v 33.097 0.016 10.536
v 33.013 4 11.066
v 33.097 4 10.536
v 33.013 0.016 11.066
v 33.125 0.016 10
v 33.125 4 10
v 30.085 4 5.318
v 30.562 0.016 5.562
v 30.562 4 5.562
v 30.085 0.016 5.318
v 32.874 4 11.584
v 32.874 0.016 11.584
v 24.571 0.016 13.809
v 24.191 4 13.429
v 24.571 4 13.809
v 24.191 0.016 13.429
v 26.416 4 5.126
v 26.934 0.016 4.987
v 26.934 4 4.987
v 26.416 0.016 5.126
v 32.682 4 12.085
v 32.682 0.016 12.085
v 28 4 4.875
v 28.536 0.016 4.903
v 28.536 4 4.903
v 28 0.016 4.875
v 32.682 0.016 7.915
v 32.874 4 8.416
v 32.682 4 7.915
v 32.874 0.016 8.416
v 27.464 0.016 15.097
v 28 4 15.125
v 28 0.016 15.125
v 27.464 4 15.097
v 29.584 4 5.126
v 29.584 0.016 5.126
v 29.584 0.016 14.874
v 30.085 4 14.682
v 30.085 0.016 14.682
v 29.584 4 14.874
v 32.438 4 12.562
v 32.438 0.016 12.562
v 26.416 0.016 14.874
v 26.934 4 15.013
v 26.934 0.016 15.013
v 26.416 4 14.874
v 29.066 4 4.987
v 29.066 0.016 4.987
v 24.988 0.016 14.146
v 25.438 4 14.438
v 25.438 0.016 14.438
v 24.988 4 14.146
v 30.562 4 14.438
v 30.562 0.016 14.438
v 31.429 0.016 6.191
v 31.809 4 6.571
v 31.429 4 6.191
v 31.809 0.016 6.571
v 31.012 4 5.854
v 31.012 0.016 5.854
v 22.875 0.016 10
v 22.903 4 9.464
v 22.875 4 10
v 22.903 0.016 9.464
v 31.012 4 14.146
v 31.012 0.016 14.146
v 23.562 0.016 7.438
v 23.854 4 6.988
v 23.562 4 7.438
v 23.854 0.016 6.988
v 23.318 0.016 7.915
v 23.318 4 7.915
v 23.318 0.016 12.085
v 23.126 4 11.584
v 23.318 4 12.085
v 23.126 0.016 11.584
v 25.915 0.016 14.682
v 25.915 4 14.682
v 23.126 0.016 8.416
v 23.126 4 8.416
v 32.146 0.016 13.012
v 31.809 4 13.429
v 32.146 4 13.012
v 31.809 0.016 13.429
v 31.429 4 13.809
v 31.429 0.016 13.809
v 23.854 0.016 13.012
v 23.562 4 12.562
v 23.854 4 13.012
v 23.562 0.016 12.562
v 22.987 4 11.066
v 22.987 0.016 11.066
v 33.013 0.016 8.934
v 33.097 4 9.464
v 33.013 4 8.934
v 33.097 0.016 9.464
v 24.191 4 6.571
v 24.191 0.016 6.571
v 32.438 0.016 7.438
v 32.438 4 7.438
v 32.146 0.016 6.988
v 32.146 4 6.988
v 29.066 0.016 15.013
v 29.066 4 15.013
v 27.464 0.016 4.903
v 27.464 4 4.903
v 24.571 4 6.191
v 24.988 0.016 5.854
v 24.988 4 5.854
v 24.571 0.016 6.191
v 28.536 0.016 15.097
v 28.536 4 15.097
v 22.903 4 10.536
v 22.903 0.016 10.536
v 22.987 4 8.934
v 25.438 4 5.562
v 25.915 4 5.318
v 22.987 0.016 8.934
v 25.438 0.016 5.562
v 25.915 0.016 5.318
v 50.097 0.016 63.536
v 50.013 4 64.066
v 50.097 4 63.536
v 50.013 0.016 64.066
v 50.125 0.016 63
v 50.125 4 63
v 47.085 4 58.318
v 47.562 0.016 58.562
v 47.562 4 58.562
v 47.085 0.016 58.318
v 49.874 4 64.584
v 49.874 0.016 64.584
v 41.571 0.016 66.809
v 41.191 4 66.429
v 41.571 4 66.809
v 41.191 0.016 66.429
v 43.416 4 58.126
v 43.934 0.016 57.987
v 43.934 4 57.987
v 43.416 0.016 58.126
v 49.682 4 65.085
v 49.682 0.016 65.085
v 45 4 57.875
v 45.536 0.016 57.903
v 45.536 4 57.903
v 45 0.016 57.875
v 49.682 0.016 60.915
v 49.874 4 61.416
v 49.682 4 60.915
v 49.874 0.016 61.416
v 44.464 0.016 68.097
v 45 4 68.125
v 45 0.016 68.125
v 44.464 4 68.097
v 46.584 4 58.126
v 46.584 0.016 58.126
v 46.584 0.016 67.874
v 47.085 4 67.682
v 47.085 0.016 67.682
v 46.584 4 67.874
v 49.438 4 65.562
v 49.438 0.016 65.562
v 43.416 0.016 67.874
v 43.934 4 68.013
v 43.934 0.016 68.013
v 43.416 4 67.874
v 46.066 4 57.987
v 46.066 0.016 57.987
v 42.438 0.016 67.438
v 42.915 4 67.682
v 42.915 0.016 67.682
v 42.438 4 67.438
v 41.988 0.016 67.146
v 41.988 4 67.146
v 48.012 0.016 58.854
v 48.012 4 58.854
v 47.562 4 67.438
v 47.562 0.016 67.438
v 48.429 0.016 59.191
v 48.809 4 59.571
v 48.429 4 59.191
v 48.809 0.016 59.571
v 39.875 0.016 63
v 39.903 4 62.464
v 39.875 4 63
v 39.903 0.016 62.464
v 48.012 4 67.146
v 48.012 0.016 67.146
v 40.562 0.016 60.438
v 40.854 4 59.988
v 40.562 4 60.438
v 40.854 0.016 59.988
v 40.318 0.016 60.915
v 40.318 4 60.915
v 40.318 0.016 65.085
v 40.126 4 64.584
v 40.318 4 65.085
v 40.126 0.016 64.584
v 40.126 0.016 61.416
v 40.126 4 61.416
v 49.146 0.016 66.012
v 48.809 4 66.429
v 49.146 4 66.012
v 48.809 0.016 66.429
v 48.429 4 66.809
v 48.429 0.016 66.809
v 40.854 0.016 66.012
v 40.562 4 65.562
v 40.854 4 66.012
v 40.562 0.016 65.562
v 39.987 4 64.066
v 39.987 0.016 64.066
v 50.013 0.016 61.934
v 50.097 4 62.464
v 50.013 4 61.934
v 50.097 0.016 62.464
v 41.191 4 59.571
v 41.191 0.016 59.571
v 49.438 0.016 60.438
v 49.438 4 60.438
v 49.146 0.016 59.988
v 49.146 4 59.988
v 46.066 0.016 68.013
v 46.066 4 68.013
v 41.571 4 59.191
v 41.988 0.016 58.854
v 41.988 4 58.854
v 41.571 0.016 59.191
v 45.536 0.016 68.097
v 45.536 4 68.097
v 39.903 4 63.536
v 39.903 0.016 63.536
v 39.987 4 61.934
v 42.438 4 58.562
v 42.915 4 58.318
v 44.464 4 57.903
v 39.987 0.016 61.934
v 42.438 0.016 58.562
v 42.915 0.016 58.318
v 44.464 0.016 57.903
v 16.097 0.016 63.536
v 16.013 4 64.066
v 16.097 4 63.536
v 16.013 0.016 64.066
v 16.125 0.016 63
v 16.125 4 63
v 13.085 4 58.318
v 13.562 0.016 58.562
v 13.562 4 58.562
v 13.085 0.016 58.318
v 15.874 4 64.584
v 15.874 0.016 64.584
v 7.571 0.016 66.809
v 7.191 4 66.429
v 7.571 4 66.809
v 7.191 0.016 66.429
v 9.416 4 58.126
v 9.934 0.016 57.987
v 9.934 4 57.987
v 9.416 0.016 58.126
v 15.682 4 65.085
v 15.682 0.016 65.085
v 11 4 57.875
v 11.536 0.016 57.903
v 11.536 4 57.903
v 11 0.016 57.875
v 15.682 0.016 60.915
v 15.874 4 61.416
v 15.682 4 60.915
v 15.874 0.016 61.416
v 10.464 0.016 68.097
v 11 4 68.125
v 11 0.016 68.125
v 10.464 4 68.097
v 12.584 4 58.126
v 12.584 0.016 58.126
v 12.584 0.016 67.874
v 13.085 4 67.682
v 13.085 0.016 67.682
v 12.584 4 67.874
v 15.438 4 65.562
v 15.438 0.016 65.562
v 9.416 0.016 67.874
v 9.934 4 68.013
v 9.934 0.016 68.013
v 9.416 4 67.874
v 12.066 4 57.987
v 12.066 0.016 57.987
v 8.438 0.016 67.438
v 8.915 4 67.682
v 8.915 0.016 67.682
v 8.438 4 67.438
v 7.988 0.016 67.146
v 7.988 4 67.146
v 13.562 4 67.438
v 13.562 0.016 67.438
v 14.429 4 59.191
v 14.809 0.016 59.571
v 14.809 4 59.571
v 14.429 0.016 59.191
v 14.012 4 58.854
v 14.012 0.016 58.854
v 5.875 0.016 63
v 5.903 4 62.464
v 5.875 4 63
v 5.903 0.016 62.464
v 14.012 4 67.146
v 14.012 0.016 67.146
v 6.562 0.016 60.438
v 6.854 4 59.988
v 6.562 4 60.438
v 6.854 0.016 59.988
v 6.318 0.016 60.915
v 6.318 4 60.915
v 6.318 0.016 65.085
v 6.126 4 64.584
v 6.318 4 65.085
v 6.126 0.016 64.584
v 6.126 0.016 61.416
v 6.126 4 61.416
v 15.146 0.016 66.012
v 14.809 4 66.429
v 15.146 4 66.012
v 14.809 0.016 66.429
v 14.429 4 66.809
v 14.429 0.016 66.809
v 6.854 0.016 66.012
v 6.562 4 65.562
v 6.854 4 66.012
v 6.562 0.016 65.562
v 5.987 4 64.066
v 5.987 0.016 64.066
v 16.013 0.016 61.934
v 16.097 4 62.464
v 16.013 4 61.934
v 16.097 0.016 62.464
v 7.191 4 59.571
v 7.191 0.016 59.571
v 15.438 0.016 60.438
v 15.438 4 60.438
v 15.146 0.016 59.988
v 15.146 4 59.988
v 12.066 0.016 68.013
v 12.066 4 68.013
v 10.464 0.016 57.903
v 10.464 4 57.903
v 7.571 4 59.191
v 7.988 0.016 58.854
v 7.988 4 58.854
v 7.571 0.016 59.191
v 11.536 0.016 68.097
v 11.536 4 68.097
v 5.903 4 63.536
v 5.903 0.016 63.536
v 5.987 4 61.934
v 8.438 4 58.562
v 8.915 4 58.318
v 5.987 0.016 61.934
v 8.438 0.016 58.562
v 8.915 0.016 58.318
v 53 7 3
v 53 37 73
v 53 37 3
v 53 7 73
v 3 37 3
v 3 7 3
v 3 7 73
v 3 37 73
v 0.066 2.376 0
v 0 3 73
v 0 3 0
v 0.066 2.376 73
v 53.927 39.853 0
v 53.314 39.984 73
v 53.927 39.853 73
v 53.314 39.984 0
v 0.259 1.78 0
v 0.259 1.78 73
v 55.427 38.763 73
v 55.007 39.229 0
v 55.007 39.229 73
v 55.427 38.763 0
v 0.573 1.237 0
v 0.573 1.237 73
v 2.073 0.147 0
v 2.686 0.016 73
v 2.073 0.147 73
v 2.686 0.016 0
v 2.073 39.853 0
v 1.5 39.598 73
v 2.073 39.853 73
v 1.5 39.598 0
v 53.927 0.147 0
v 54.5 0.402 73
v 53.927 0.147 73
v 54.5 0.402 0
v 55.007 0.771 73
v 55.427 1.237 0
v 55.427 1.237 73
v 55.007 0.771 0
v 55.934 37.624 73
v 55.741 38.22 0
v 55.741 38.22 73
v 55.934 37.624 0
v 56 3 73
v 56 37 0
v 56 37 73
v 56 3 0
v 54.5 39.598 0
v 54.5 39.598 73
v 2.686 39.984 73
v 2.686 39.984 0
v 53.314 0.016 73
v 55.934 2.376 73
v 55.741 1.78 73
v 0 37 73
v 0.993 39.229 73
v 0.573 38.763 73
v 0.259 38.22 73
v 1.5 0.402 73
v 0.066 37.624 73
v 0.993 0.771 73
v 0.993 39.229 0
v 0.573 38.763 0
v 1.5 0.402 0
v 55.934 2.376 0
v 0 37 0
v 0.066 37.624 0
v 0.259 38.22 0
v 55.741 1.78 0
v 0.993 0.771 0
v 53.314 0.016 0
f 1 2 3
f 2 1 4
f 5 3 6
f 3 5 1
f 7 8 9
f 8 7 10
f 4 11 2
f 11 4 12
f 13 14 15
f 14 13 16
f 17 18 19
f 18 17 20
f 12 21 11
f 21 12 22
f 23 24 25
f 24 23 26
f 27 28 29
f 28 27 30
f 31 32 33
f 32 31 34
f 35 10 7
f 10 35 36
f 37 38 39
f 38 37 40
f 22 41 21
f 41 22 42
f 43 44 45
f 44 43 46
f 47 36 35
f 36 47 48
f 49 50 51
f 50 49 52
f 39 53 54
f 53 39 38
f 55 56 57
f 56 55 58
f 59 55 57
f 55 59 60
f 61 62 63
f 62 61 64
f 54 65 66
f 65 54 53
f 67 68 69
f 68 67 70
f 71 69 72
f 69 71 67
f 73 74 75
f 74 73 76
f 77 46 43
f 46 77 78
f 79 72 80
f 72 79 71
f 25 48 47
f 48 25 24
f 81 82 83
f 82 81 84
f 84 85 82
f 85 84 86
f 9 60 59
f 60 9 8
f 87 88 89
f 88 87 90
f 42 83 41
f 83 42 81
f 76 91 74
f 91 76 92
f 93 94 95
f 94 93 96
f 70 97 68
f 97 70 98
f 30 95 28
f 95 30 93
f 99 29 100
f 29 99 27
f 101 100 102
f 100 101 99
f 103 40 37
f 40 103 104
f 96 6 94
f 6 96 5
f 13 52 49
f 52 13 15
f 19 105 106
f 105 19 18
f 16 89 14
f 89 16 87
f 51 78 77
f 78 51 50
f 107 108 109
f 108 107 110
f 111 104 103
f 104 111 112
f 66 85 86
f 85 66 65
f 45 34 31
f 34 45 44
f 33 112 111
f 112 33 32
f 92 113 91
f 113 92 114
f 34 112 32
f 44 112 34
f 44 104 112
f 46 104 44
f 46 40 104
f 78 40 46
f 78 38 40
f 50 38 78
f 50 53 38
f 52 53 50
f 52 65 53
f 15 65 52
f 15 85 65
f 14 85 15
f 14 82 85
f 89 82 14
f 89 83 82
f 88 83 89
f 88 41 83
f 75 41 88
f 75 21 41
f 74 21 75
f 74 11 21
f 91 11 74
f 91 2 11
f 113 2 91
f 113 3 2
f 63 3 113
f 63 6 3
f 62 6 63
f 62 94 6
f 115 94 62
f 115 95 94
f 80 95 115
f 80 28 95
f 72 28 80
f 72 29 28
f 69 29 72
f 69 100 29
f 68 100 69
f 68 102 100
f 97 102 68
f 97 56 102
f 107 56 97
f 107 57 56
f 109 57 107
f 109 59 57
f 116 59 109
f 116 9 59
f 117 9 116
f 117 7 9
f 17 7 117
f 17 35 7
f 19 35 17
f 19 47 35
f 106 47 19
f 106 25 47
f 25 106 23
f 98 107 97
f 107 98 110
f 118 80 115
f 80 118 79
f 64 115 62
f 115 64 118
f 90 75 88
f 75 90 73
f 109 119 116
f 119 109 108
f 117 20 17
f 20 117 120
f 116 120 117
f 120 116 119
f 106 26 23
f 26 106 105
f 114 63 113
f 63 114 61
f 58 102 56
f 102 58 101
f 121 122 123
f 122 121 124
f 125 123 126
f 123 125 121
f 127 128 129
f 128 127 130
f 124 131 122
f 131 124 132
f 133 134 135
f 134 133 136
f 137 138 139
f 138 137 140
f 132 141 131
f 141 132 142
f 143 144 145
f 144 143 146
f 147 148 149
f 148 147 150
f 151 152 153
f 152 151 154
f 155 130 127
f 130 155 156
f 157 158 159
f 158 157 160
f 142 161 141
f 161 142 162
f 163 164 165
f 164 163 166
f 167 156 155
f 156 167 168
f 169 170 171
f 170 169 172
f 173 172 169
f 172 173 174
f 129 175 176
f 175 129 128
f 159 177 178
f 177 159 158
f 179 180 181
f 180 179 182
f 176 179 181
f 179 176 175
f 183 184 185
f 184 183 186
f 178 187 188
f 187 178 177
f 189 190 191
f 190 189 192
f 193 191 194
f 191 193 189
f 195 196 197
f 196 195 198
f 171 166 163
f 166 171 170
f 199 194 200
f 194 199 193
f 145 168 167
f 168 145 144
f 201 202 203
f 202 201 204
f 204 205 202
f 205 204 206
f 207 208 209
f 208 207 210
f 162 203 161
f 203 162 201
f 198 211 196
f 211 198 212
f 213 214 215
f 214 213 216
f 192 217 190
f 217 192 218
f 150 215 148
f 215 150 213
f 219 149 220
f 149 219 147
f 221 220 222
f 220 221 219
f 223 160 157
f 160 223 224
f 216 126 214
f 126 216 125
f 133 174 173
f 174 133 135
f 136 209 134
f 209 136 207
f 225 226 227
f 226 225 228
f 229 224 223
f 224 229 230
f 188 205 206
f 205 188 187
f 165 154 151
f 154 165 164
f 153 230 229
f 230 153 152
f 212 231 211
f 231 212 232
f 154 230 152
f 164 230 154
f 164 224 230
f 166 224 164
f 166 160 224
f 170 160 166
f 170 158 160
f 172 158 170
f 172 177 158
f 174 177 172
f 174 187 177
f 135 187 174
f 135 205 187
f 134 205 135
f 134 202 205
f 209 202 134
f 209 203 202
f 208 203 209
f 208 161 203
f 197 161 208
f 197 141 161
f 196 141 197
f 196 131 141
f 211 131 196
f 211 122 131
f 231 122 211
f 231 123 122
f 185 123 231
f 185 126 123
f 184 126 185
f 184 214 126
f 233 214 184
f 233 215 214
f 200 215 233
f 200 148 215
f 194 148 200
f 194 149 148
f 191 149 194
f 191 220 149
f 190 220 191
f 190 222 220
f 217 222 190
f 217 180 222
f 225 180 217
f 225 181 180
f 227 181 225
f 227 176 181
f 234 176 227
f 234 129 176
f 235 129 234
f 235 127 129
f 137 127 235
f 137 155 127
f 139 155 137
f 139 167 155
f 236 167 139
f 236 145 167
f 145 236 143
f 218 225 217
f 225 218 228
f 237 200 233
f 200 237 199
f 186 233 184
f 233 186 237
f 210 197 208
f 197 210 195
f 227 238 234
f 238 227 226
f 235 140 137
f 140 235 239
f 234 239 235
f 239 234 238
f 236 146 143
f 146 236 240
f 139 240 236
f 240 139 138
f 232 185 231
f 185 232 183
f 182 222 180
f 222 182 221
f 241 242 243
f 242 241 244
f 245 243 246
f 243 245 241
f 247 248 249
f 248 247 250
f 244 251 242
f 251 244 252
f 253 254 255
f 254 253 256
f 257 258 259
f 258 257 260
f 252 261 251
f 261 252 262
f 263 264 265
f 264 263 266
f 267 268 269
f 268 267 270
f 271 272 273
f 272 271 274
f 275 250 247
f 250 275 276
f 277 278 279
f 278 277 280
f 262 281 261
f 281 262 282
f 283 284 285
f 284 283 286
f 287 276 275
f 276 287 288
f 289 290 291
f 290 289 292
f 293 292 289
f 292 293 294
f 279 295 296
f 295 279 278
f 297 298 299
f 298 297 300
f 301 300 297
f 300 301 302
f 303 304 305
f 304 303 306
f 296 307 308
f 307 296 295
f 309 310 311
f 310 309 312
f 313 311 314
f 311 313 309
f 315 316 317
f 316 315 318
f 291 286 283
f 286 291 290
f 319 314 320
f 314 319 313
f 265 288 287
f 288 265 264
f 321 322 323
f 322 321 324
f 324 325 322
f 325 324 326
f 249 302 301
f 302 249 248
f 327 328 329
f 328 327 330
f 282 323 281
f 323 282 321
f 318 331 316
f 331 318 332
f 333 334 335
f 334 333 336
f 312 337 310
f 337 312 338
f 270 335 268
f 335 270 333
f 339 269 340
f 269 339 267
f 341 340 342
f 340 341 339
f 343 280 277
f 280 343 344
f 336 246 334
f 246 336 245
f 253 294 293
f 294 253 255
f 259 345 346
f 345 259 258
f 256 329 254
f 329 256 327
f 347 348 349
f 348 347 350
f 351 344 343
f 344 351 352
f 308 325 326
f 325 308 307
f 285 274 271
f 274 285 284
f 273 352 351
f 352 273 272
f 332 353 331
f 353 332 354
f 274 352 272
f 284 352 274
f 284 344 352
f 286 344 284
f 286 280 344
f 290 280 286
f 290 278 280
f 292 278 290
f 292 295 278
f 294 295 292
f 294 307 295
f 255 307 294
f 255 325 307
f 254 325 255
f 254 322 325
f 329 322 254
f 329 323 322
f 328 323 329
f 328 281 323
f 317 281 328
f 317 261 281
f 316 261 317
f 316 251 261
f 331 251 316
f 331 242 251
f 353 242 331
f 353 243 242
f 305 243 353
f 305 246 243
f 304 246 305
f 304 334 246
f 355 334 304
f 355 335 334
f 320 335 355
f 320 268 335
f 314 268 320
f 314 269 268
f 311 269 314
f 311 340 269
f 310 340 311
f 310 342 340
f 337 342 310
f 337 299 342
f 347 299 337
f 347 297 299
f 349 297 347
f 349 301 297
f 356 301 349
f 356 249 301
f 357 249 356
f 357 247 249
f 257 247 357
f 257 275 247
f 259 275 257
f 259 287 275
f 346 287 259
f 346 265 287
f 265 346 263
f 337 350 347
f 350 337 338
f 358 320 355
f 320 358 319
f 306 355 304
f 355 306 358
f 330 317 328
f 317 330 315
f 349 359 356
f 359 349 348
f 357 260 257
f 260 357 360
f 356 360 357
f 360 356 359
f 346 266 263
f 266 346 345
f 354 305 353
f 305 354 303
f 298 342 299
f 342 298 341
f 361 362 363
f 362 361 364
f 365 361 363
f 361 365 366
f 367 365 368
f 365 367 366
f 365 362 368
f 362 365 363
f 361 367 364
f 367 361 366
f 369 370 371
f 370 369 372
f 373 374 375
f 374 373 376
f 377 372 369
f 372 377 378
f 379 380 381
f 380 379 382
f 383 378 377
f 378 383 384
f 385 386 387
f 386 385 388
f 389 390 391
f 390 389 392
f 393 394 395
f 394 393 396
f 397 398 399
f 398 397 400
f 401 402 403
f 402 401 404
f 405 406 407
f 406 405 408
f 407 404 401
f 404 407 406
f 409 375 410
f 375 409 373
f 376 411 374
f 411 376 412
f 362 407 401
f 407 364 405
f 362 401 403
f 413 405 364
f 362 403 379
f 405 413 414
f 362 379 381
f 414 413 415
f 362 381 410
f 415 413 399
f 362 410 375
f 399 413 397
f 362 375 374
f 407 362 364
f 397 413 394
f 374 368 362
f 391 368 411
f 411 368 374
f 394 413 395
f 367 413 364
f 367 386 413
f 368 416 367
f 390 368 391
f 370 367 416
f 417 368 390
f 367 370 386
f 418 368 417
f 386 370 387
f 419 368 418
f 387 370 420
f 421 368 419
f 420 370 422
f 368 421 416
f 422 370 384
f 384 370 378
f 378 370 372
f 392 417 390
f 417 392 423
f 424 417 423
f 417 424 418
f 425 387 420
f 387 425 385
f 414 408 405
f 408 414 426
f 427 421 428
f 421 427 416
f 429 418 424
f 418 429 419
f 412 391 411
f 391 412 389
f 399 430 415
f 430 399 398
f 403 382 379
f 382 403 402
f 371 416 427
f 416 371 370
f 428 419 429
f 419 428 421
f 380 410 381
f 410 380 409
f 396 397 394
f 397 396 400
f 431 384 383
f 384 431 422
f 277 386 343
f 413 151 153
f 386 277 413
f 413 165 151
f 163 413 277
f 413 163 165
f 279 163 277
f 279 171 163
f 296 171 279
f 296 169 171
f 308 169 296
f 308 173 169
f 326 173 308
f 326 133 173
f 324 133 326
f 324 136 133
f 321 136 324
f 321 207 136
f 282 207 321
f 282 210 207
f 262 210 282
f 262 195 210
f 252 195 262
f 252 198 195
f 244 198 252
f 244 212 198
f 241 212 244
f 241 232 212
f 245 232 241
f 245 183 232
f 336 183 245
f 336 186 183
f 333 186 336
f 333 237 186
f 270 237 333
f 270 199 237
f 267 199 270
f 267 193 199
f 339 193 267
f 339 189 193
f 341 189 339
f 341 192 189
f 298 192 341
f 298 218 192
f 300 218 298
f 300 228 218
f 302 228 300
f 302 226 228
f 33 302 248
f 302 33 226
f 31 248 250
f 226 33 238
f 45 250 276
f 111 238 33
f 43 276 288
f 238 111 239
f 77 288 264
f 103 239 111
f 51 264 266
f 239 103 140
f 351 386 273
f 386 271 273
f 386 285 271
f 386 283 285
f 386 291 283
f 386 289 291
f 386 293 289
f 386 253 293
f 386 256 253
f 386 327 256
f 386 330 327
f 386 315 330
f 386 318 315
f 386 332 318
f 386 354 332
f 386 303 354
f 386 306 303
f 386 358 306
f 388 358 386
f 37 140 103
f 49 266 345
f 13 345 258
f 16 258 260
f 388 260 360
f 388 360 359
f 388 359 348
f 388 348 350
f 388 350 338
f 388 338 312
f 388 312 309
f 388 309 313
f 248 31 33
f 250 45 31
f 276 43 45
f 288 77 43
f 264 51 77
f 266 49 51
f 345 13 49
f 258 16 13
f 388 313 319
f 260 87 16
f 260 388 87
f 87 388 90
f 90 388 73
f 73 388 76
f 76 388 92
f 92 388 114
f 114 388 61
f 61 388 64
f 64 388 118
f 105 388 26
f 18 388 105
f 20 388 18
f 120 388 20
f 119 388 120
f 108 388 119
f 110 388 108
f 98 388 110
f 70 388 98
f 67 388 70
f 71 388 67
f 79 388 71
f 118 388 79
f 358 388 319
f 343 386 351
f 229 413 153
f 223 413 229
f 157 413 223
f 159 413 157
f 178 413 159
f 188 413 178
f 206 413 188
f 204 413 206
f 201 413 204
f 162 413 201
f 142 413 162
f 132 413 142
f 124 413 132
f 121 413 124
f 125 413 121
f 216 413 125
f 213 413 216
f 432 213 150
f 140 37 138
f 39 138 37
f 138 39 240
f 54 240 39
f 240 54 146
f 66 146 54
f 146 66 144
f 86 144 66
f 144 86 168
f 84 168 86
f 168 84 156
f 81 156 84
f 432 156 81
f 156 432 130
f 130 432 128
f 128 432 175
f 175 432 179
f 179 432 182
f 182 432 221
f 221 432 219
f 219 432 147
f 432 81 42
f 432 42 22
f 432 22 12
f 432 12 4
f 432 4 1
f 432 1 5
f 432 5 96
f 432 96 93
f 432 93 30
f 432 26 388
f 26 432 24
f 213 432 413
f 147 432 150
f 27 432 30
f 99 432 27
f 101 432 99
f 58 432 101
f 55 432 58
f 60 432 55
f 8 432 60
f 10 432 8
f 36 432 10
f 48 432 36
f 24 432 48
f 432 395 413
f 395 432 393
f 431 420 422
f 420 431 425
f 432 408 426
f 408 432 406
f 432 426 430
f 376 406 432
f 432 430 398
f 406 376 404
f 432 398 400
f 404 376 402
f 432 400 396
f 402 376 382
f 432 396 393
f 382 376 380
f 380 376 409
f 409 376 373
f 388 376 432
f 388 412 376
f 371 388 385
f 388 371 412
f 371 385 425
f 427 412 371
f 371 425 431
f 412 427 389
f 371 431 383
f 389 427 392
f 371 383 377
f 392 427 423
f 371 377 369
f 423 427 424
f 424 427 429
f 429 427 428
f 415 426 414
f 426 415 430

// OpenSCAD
// Inner width
cube_w = 50; // [10:1:200]

// Inner height
cube_h = 70; // [10:1:200]

// Inner depth
cube_d = 30; // [10:1:200]

// Wall thickness
cube_t = 3; // [1:0.1:10]

// Magnet diameter
magnet_d = 10; // [1:0.1:40]

// Magnet depth
magnet_t = 4; // [1:0.1:20]

// How many magnets?
magnets = 3; // [1:1:5]

// Do you want rounded edges?
rounded = 1; // [1:Yes,0:No]

// Do you want a text label?
label = 0; // [1:Yes,0:No]

// The text you want on the front
TextLabel = "keys";

// Font size
font_size = 10; // [4:1:30]
font = "REGISTRATION PLATE UK:style=Bold";

/* [Hidden] */
slack = 0.25; // Slack
detail = 60;  // Variable for detail of cylinder and square. High number = high detail

difference() {
    
  // ******
  // Solids
  // ******  
  union(){
   
  if (rounded == 0) {
      cube([cube_w+cube_t*2,cube_d+cube_t*2+magnet_t,cube_h+cube_t],false);
  } // End if rounded
          
  if (rounded == 1) {   
     roundedcube([cube_w+cube_t*2,cube_d+cube_t*2+magnet_t,cube_h+cube_t], false, cube_t, "z");
  } // End if rounded
  
  } // End union Solids

 
  // *********
  // Subtracts
  // *********  
  union(){
  
  if (label == 1) {
      
    if (cube_t >= 2) {
   // Cut out text
   translate([cube_w/2+cube_t,cube_d+cube_t*2+magnet_t-1,cube_h/2+cube_t/2]) {
    rotate([90,0,180]) {
      linear_extrude(height = 1.6) {
        text(text = str(TextLabel), font = font, size = font_size, valign = "center", halign = "center");
      }
    }
    }
   } 
   
      if (cube_t < 2) {
   // Cut out text
   translate([cube_w/2+cube_t,cube_d+cube_t*2+magnet_t-0.6,cube_h/2+cube_t/2]) {
    rotate([90,0,180]) {
      linear_extrude(height = 1.6) {
        text(text = str(TextLabel), font = font, size = font_size, valign = "center", halign = "center");
      }
    }
    }
   } 
   
    }
      
  if (magnets == 1) {
          translate([cube_w/2+cube_t,magnet_t,cube_h/2+cube_t]) {
        rotate([90,0,0]) { 
          cylinder(d1=magnet_d+slack,d2=magnet_d+slack,h=magnet_t+slack,$fn=detail);
        } // End rotate
      } // End translate
   } // End if magnets 
 
   if (magnets == 2) {
  translate([cube_w+cube_t*2-(magnet_d/2+cube_t*2),magnet_t,cube_h+cube_t-magnet_d]) {
    rotate([90,0,0]) { 
      cylinder(d1=magnet_d+slack,d2=magnet_d+slack,h=magnet_t+slack,$fn=detail);
    } // End rotate
  } // End translate
 
  translate([magnet_d/2+cube_t*2,magnet_t,cube_h+cube_t-magnet_d]) {
    rotate([90,0,0]) { 
      cylinder(d1=magnet_d+slack,d2=magnet_d+slack,h=magnet_t+slack,$fn=detail);
    } // End rotate
  } // End translate
  
  } // End if magnets
  
  if (magnets == 3) {
      translate([cube_w/2+cube_t,magnet_t,magnet_d]) {
        rotate([90,0,0]) { 
          cylinder(d1=magnet_d+slack,d2=magnet_d+slack,h=magnet_t+slack,$fn=detail);
        } // End rotate
      } // End translate
      
       translate([cube_w+cube_t*2-(magnet_d/2+cube_t*2),magnet_t,cube_h+cube_t-magnet_d]) {
    rotate([90,0,0]) { 
      cylinder(d1=magnet_d+slack,d2=magnet_d+slack,h=magnet_t+slack,$fn=detail);
    } // End rotate
  } // End translate
 
  translate([magnet_d/2+cube_t*2,magnet_t,cube_h+cube_t-magnet_d]) {
    rotate([90,0,0]) { 
      cylinder(d1=magnet_d+slack,d2=magnet_d+slack,h=magnet_t+slack,$fn=detail);
    } // End rotate
  } // End translate
  
  } // End if magnets
  
  if (magnets == 4) {
      
      translate([cube_w+cube_t*2-(magnet_d/2+cube_t*2),magnet_t,cube_h+cube_t-magnet_d]) {
    rotate([90,0,0]) { 
      cylinder(d1=magnet_d+slack,d2=magnet_d+slack,h=magnet_t+slack,$fn=detail);
    } // End rotate
  } // End translate
 
  translate([magnet_d/2+cube_t*2,magnet_t,cube_h+cube_t-magnet_d]) {
    rotate([90,0,0]) { 
      cylinder(d1=magnet_d+slack,d2=magnet_d+slack,h=magnet_t+slack,$fn=detail);
    } // End rotate
  } // End translate
      
       translate([cube_w+cube_t*2-(magnet_d/2+cube_t*2),magnet_t,magnet_d]) {
         rotate([90,0,0]) { 
         cylinder(d1=magnet_d+slack,d2=magnet_d+slack,h=magnet_t+slack,$fn=detail);
    } // End rotate
  } // End translate
 
  translate([magnet_d/2+cube_t*2,magnet_t,magnet_d]) {
    rotate([90,0,0]) { 
      cylinder(d1=magnet_d+slack,d2=magnet_d+slack,h=magnet_t+slack,$fn=detail);
    } // End rotate
  } // End translate
 } // End if magnets
  
 
  if (magnets == 5) {
      
       translate([cube_w+cube_t*2-(magnet_d/2+cube_t*2),magnet_t,cube_h+cube_t-magnet_d]) {
    rotate([90,0,0]) { 
      cylinder(d1=magnet_d+slack,d2=magnet_d+slack,h=magnet_t+slack,$fn=detail);
    } // End rotate
  } // End translate
 
  translate([magnet_d/2+cube_t*2,magnet_t,cube_h+cube_t-magnet_d]) {
    rotate([90,0,0]) { 
      cylinder(d1=magnet_d+slack,d2=magnet_d+slack,h=magnet_t+slack,$fn=detail);
    } // End rotate
  } // End translate
      
       translate([cube_w+cube_t*2-(magnet_d/2+cube_t*2),magnet_t,magnet_d]) {
         rotate([90,0,0]) { 
         cylinder(d1=magnet_d+slack,d2=magnet_d+slack,h=magnet_t+slack,$fn=detail);
    } // End rotate
  } // End translate
 
  translate([magnet_d/2+cube_t*2,magnet_t,magnet_d]) {
    rotate([90,0,0]) { 
      cylinder(d1=magnet_d+slack,d2=magnet_d+slack,h=magnet_t+slack,$fn=detail);
    } // End rotate
  } // End translate

    translate([cube_w/2+cube_t,magnet_t,cube_h/2+cube_t]) {
        rotate([90,0,0]) { 
          cylinder(d1=magnet_d+slack,d2=magnet_d+slack,h=magnet_t+slack,$fn=detail);
        } // End rotate
      } // End translate
  
 } // End if magnets
  
 
     translate([cube_t,cube_t+magnet_t,cube_t]) {
      cube([cube_w,cube_d,cube_h+1],false);
    } // End translate
 
 
  
  } // End union subtracts

} // End difference


// Rounded corners from https://danielupshaw.com/openscad-rounded-corners/

// Set to 0.01 for higher definition curves (renders slower)
$fs = 0.2;

module roundedcube(size = [1, 1, 1], center = false, radius = 0.5, apply_to = "all") {
	// If single value, convert to [x, y, z] vector
	size = (size[0] == undef) ? [size, size, size] : size;

	translate_min = radius;
	translate_xmax = size[0] - radius;
	translate_ymax = size[1] - radius;
	translate_zmax = size[2] - radius;

	diameter = radius * 2;

	obj_translate = (center == false) ?
		[0, 0, 0] : [
			-(size[0] / 2),
			-(size[1] / 2),
			-(size[2] / 2)
		];

	translate(v = obj_translate) {
		hull() {
			for (translate_x = [translate_min, translate_xmax]) {
				x_at = (translate_x == translate_min) ? "min" : "max";
				for (translate_y = [translate_min, translate_ymax]) {
					y_at = (translate_y == translate_min) ? "min" : "max";
					for (translate_z = [translate_min, translate_zmax]) {
						z_at = (translate_z == translate_min) ? "min" : "max";

						translate(v = [translate_x, translate_y, translate_z])
						if (
							(apply_to == "all") ||
							(apply_to == "xmin" && x_at == "min") || (apply_to == "xmax" && x_at == "max") ||
							(apply_to == "ymin" && y_at == "min") || (apply_to == "ymax" && y_at == "max") ||
							(apply_to == "zmin" && z_at == "min") || (apply_to == "zmax" && z_at == "max")
						) {
							sphere(r = radius);
						} else {
							rotate = 
								(apply_to == "xmin" || apply_to == "xmax" || apply_to == "x") ? [0, 90, 0] : (
								(apply_to == "ymin" || apply_to == "ymax" || apply_to == "y") ? [90, 90, 0] :
								[0, 0, 0]
							);
							rotate(a = rotate)
							cylinder(h = diameter, r = radius, center = true);
						}
					}
				}
			}
		}
	}
}
